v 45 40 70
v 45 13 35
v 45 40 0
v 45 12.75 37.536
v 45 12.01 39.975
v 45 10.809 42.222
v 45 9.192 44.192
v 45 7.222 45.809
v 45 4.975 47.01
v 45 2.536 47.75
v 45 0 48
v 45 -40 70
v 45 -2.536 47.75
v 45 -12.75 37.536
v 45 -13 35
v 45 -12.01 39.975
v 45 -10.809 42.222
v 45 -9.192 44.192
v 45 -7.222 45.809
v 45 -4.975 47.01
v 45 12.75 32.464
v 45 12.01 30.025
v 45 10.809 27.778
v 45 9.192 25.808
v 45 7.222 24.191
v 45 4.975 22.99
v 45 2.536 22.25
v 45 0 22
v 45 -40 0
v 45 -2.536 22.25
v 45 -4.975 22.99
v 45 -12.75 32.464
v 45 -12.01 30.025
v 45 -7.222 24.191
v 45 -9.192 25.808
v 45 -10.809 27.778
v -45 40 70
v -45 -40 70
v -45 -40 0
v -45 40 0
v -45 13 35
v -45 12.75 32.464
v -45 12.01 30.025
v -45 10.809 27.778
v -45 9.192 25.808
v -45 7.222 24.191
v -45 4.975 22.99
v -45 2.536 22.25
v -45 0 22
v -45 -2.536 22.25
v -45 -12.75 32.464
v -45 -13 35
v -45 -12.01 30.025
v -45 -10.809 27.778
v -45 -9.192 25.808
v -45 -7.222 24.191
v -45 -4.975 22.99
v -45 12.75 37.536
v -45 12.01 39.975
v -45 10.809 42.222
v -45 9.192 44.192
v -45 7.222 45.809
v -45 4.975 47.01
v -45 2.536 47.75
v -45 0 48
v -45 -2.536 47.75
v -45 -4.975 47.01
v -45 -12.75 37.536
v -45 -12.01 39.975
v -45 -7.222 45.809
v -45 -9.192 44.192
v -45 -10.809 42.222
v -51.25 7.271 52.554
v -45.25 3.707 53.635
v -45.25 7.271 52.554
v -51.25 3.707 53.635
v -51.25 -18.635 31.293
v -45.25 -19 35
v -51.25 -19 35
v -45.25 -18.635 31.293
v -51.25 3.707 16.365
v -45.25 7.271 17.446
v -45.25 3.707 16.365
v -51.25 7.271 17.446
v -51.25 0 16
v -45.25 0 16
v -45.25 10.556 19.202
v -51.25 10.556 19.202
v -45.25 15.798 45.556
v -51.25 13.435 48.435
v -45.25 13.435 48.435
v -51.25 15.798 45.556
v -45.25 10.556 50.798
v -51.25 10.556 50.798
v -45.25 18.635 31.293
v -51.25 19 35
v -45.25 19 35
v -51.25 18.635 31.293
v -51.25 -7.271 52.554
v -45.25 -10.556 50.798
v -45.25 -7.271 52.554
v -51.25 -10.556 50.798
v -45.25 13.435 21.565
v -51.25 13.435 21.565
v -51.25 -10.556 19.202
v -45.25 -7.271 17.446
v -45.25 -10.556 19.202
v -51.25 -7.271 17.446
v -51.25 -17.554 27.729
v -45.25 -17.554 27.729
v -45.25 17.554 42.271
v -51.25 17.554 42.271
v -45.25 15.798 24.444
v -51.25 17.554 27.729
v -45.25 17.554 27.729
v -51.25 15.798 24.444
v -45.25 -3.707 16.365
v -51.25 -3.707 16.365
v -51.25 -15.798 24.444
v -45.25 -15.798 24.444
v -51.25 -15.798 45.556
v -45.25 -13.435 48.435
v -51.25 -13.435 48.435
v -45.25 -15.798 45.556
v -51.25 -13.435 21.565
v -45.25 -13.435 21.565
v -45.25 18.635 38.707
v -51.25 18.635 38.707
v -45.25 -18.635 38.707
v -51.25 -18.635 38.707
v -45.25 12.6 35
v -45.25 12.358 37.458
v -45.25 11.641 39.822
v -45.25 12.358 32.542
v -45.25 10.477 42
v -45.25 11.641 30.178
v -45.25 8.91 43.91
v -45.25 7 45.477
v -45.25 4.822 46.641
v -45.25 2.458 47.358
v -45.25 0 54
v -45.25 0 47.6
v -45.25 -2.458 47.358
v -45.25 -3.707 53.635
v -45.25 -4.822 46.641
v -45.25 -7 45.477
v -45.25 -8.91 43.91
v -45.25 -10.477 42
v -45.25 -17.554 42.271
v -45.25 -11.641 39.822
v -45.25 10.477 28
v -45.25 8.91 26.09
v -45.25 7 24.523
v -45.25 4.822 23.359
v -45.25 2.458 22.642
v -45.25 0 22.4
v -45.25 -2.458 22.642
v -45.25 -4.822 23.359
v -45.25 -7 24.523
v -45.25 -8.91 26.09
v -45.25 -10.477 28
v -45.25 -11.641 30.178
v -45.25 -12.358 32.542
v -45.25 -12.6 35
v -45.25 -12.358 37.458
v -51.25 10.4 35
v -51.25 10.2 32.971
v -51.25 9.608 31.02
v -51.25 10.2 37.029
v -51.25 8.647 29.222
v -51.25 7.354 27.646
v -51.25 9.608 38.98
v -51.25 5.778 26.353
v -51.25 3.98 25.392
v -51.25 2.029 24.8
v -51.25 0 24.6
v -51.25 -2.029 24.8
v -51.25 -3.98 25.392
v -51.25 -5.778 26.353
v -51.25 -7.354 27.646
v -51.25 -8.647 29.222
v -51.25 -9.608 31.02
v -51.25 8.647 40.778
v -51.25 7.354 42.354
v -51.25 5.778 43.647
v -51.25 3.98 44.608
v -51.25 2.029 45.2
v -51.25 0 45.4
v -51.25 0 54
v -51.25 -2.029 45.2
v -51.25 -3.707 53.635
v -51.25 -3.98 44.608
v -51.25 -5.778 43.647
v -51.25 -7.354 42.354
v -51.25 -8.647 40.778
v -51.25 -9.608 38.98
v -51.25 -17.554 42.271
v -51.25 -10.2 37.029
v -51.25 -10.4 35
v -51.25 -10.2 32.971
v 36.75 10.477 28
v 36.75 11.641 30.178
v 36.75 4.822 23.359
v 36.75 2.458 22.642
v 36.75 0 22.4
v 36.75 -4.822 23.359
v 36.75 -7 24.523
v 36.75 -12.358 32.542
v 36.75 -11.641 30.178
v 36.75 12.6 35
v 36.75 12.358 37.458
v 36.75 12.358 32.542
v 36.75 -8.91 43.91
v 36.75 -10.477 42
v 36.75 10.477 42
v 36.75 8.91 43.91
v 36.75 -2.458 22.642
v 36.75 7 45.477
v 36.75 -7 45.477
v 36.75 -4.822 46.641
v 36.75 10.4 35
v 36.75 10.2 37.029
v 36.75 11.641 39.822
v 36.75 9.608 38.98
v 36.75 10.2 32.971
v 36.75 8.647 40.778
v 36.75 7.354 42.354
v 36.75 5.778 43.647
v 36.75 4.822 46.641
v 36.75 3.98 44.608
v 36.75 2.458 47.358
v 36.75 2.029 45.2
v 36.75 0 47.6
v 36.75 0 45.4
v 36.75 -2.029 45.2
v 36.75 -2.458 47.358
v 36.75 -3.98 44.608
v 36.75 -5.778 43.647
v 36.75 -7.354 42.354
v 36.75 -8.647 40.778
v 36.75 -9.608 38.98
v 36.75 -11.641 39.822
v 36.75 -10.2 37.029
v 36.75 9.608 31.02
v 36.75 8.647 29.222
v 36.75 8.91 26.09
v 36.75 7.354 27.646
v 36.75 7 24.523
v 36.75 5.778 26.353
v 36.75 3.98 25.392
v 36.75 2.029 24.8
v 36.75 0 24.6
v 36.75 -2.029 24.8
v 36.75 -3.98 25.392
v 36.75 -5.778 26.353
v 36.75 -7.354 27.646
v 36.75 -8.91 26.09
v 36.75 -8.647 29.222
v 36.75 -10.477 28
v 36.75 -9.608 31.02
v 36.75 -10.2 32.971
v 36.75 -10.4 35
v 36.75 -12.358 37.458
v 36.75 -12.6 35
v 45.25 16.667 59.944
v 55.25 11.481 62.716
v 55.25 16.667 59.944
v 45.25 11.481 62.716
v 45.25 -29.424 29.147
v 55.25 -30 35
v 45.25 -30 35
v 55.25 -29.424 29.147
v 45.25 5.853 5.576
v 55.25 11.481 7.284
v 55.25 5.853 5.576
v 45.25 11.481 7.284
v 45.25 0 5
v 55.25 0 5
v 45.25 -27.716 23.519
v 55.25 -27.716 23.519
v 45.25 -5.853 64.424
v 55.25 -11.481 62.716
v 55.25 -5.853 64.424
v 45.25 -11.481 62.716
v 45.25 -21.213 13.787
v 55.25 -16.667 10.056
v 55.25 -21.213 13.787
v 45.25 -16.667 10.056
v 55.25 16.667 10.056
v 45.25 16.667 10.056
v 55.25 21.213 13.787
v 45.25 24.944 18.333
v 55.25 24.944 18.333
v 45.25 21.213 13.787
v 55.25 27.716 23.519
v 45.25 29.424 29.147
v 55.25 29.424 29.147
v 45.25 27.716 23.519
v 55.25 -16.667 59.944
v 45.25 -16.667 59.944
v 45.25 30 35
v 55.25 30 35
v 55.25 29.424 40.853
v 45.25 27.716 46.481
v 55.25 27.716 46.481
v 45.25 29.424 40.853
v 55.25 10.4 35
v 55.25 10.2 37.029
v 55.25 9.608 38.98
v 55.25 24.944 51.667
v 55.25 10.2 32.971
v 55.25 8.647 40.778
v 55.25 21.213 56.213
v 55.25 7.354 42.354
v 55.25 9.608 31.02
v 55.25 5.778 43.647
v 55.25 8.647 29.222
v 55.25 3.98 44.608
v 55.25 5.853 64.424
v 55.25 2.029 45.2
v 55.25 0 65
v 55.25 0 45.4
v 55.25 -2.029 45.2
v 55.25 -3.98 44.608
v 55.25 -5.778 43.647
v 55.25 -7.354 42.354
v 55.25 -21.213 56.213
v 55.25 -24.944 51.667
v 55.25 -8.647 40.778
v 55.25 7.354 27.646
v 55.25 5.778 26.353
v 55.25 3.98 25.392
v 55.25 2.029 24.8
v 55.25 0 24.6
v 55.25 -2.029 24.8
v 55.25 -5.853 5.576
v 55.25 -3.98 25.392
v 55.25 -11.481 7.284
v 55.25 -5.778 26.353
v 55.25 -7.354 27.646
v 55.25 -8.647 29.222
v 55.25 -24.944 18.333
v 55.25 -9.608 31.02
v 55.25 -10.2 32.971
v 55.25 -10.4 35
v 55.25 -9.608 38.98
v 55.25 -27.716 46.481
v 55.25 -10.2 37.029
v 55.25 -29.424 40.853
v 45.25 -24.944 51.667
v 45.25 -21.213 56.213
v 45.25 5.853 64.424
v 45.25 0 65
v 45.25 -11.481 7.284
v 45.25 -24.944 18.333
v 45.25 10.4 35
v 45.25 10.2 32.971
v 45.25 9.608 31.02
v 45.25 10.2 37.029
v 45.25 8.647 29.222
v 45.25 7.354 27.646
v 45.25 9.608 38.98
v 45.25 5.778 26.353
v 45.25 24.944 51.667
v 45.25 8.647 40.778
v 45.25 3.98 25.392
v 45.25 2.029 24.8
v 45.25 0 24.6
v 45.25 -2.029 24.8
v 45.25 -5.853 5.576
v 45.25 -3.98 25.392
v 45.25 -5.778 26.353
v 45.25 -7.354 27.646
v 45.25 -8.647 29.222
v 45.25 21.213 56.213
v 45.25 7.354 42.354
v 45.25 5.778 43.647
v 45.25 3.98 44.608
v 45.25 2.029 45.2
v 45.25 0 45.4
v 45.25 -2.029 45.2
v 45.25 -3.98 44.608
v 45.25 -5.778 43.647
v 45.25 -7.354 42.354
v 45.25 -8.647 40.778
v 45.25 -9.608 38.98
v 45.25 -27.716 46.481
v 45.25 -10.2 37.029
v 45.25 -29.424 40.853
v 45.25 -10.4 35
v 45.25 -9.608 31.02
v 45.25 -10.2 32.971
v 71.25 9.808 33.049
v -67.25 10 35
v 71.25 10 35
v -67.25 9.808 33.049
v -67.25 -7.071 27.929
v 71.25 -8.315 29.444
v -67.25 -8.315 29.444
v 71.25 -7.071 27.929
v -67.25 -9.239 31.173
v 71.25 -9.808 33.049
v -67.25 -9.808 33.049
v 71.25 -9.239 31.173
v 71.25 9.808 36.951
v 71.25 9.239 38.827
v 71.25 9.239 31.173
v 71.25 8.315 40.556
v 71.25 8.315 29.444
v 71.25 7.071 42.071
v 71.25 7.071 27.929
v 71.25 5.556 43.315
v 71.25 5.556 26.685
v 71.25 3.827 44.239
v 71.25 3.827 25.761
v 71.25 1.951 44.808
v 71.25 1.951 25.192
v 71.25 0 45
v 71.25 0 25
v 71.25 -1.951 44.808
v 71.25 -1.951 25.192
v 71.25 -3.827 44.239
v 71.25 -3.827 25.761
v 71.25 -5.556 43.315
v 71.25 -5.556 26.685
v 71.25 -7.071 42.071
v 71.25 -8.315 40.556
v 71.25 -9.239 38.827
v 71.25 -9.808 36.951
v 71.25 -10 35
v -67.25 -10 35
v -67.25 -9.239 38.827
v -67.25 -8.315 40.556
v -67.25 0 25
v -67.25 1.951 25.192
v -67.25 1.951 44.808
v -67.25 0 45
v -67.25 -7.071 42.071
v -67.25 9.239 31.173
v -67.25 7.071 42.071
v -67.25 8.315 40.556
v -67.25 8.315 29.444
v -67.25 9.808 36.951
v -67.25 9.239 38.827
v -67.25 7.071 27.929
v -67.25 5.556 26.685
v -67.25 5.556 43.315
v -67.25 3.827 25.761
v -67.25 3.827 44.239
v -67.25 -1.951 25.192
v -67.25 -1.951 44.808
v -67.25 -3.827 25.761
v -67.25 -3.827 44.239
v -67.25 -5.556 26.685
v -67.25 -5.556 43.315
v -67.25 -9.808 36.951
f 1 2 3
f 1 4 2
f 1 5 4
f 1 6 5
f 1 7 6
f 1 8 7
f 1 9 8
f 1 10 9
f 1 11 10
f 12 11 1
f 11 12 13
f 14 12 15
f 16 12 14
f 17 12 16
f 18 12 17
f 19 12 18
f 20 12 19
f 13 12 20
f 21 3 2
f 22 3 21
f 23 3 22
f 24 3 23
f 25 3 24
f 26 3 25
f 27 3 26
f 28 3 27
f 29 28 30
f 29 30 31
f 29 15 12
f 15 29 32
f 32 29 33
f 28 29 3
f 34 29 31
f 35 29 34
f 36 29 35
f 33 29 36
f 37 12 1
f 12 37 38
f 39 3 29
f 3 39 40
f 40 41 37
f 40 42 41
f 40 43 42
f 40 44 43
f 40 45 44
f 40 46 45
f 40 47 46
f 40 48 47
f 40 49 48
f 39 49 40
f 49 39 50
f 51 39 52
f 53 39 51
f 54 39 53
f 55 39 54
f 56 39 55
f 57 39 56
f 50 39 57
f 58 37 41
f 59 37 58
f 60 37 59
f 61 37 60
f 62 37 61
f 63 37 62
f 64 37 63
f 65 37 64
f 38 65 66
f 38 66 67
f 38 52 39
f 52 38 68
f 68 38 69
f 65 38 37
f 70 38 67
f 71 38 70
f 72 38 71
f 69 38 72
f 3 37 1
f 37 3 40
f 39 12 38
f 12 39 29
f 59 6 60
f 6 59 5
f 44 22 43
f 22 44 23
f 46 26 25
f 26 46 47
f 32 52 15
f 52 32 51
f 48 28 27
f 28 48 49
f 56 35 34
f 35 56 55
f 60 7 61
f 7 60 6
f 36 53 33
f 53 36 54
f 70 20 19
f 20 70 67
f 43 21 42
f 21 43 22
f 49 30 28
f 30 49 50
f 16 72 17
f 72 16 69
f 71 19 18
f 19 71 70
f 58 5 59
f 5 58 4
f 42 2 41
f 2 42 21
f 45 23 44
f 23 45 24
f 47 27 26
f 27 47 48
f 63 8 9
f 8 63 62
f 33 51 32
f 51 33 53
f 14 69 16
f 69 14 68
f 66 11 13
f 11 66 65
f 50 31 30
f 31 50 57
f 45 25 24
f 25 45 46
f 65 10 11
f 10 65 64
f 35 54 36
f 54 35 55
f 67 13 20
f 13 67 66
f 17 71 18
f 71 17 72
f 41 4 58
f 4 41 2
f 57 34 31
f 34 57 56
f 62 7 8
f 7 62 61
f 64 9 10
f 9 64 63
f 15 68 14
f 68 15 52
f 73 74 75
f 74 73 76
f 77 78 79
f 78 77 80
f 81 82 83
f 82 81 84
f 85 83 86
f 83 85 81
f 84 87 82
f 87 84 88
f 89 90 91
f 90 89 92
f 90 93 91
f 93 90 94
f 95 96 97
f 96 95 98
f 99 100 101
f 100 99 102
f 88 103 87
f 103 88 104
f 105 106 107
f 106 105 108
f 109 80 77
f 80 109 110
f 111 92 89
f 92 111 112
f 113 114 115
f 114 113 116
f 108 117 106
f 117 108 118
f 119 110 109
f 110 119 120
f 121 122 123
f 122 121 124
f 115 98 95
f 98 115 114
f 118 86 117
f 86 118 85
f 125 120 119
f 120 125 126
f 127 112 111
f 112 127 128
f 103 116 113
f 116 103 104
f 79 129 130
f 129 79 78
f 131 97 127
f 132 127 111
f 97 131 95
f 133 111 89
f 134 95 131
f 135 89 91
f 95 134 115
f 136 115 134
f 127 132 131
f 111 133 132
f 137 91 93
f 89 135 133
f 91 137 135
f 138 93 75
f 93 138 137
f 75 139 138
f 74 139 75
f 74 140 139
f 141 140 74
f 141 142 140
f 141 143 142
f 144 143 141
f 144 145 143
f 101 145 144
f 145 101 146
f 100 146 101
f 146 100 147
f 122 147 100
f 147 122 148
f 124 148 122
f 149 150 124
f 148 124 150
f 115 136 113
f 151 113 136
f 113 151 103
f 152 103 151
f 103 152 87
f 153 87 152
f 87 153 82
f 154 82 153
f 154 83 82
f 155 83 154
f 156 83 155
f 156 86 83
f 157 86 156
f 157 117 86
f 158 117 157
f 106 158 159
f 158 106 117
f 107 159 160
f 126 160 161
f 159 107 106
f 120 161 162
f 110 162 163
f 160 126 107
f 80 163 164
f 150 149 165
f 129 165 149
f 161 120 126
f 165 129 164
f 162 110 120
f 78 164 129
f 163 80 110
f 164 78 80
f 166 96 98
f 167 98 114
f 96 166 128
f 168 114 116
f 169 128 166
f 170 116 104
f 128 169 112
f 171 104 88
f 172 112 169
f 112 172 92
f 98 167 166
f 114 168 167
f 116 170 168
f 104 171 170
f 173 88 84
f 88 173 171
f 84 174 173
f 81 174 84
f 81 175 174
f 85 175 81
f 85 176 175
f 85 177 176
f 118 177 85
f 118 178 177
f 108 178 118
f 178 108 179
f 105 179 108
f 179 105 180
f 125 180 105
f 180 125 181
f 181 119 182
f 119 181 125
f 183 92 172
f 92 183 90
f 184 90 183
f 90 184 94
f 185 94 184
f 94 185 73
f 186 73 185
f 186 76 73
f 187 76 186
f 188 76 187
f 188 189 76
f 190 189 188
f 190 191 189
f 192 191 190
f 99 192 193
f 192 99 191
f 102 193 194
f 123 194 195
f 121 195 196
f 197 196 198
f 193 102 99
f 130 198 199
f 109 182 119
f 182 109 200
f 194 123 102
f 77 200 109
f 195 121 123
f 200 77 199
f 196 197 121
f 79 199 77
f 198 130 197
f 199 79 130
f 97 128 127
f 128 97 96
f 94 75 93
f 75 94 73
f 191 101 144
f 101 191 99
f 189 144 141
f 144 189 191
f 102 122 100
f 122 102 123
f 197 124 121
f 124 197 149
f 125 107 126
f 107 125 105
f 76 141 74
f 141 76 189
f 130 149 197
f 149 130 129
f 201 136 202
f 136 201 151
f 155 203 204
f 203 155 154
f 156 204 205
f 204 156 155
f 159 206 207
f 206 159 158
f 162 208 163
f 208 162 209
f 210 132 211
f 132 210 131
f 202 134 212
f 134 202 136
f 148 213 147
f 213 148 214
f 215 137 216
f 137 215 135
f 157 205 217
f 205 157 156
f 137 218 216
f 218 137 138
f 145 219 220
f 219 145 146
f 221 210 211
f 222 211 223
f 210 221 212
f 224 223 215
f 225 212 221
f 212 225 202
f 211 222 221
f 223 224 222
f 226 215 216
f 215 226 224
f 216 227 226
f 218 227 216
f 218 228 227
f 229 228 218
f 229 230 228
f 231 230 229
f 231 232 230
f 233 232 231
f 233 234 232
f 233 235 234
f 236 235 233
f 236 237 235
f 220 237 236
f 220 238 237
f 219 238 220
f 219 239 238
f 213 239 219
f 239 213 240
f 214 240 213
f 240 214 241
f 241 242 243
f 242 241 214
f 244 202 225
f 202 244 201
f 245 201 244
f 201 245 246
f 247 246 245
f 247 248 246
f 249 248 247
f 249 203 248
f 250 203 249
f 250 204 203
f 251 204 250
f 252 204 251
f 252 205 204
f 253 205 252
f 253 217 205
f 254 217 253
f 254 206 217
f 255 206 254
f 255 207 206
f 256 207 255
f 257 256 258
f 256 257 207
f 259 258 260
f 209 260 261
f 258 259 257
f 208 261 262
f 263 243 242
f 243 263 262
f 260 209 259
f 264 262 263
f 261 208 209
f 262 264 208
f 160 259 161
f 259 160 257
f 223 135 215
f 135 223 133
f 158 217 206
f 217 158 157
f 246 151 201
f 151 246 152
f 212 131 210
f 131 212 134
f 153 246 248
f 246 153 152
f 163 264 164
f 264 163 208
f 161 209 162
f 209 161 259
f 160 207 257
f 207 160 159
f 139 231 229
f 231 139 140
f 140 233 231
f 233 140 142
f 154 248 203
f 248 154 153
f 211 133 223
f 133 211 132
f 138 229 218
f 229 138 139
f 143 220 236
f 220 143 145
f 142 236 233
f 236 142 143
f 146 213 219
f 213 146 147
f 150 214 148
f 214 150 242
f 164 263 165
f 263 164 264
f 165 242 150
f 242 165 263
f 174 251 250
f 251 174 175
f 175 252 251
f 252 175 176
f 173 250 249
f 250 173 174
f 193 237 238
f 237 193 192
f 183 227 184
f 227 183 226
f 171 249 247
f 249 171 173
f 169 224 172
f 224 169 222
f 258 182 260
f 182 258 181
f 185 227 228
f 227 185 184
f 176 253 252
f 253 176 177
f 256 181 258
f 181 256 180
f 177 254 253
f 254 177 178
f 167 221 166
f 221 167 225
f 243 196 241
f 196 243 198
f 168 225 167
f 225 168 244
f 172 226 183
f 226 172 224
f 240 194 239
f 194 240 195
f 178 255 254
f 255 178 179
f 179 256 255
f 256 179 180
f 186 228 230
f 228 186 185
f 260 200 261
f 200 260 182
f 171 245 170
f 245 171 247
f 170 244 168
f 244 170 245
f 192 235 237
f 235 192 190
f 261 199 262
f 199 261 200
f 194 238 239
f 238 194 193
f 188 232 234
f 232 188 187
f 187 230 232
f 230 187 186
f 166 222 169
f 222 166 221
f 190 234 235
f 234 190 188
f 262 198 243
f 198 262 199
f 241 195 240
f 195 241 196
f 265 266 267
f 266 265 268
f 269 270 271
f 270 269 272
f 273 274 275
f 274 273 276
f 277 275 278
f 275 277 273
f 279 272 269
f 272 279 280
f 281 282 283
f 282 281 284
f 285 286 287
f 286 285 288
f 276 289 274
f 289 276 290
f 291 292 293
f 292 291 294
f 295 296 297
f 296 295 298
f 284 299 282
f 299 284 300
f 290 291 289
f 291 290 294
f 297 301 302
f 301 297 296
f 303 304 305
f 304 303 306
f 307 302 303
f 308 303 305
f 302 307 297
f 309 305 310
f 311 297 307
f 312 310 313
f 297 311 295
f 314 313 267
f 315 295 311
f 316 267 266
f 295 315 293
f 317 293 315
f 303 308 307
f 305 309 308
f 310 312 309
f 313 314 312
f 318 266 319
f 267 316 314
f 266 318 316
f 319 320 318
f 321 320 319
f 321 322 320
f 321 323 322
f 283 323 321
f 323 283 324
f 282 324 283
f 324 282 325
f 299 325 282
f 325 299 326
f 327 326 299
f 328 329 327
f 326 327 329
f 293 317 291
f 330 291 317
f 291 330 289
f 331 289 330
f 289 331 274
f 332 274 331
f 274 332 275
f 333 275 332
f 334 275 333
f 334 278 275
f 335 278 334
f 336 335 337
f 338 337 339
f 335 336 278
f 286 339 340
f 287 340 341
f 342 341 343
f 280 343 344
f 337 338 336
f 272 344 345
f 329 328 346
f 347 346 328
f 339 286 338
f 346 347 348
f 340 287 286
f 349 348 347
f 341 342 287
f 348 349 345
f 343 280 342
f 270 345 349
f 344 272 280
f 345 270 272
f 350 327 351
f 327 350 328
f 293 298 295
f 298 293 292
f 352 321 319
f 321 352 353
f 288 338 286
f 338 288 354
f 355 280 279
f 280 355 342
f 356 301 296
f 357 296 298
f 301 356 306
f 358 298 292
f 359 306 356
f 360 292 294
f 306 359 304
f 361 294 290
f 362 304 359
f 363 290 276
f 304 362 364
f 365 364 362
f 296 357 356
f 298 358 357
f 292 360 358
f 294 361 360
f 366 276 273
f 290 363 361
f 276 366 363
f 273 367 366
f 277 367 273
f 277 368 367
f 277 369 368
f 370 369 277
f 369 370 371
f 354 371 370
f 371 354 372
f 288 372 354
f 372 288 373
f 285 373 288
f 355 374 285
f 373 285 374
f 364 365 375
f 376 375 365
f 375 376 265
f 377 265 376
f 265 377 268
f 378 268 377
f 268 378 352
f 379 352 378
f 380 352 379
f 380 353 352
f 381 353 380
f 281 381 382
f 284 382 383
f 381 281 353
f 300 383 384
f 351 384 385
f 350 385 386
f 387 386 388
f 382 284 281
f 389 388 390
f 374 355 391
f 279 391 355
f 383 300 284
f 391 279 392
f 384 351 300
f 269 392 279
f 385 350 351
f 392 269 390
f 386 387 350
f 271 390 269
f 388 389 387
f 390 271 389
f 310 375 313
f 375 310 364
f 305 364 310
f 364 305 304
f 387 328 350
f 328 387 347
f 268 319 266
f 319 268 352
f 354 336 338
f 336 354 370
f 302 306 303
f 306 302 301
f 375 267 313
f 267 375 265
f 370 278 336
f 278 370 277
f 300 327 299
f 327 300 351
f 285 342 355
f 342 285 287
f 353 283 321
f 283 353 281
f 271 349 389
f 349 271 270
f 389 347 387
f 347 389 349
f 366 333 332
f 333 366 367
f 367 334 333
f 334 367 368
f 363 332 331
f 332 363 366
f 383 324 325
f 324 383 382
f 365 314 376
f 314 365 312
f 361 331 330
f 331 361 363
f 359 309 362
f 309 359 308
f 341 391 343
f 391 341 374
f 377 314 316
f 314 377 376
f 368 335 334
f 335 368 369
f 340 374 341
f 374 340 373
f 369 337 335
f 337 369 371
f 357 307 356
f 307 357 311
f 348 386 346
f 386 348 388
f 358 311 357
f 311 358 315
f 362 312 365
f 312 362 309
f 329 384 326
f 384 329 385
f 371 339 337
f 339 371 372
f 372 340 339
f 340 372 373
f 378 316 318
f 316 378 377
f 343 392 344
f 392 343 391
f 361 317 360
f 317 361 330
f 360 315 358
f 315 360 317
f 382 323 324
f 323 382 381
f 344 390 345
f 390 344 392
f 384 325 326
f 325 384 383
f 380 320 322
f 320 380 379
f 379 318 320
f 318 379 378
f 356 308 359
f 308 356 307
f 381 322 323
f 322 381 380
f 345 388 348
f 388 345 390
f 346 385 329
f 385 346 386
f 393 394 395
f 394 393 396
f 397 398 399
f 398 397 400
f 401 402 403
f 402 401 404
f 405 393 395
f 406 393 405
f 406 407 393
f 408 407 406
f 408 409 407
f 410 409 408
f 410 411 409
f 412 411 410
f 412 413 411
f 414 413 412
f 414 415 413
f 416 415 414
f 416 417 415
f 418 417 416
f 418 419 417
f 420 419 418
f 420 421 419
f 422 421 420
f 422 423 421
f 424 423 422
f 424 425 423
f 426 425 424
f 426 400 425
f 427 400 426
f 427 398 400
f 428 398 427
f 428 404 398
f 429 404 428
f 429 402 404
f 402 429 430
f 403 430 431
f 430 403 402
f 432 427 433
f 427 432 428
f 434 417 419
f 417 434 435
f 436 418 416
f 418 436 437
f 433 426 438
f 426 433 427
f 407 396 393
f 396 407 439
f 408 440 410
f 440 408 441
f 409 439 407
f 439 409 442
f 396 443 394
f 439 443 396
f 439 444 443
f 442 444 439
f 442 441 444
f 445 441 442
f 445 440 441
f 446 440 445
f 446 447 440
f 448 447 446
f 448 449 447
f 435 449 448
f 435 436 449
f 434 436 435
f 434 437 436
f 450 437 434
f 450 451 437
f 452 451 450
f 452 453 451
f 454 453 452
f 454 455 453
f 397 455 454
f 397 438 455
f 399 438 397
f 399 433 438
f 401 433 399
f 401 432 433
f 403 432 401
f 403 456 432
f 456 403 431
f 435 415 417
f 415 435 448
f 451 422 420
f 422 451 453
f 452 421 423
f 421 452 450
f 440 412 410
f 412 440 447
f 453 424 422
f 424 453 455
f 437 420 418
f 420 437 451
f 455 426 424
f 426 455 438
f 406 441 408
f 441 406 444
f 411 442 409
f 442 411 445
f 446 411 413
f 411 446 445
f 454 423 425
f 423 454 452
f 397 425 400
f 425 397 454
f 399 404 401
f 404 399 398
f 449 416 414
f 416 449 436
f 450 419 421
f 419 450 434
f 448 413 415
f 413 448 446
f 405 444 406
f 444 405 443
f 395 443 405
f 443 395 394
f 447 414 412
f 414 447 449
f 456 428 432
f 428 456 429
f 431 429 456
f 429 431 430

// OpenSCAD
$fn = 32;

// ------------------------------------------------------------------------
// Bushed housing: 90 x 80 x 70 mm housing, bushing d25.2
// Every part is its own module, assembly() places them once.
// ------------------------------------------------------------------------

// --- part 1 ---
module housing() {
  difference() {
    translate([-45, -40, 0]) cube([90, 80, 70]);
    translate([0, 0, 35]) rotate([0, 90, 0]) cylinder(h = 92, d = 26, center = true);
  }
}

// --- part 2 ---
module bushing() {
  difference() {
    union() {
      cylinder(h = 6, d = 38);
      translate([0, 0, 6]) cylinder(h = 82, d = 25.2);
    }
    translate([0, 0, -1]) cylinder(h = 90, d = 20.8);
  }
}

// --- part 3 ---
module shaft() {
  translate([0, 0, -69.25]) cylinder(h = 138.5, d = 20);
}

// --- part 4 ---
module cover() {
  difference() {
    cylinder(h = 10, d = 60);
    translate([0, 0, -1]) cylinder(h = 12, d = 20.8);
  }
}

// --- assembly ---
module assembly() {
  translate([0, 0, 0]) rotate([0, 0, 0]) housing();
  translate([-51.25, 0, 35]) rotate([0, 90, 0]) bushing();
  translate([2, 0, 35]) rotate([0, 90, 0]) shaft();
  translate([45.25, 0, 35]) rotate([0, 90, 0]) cover();
}

assembly();
